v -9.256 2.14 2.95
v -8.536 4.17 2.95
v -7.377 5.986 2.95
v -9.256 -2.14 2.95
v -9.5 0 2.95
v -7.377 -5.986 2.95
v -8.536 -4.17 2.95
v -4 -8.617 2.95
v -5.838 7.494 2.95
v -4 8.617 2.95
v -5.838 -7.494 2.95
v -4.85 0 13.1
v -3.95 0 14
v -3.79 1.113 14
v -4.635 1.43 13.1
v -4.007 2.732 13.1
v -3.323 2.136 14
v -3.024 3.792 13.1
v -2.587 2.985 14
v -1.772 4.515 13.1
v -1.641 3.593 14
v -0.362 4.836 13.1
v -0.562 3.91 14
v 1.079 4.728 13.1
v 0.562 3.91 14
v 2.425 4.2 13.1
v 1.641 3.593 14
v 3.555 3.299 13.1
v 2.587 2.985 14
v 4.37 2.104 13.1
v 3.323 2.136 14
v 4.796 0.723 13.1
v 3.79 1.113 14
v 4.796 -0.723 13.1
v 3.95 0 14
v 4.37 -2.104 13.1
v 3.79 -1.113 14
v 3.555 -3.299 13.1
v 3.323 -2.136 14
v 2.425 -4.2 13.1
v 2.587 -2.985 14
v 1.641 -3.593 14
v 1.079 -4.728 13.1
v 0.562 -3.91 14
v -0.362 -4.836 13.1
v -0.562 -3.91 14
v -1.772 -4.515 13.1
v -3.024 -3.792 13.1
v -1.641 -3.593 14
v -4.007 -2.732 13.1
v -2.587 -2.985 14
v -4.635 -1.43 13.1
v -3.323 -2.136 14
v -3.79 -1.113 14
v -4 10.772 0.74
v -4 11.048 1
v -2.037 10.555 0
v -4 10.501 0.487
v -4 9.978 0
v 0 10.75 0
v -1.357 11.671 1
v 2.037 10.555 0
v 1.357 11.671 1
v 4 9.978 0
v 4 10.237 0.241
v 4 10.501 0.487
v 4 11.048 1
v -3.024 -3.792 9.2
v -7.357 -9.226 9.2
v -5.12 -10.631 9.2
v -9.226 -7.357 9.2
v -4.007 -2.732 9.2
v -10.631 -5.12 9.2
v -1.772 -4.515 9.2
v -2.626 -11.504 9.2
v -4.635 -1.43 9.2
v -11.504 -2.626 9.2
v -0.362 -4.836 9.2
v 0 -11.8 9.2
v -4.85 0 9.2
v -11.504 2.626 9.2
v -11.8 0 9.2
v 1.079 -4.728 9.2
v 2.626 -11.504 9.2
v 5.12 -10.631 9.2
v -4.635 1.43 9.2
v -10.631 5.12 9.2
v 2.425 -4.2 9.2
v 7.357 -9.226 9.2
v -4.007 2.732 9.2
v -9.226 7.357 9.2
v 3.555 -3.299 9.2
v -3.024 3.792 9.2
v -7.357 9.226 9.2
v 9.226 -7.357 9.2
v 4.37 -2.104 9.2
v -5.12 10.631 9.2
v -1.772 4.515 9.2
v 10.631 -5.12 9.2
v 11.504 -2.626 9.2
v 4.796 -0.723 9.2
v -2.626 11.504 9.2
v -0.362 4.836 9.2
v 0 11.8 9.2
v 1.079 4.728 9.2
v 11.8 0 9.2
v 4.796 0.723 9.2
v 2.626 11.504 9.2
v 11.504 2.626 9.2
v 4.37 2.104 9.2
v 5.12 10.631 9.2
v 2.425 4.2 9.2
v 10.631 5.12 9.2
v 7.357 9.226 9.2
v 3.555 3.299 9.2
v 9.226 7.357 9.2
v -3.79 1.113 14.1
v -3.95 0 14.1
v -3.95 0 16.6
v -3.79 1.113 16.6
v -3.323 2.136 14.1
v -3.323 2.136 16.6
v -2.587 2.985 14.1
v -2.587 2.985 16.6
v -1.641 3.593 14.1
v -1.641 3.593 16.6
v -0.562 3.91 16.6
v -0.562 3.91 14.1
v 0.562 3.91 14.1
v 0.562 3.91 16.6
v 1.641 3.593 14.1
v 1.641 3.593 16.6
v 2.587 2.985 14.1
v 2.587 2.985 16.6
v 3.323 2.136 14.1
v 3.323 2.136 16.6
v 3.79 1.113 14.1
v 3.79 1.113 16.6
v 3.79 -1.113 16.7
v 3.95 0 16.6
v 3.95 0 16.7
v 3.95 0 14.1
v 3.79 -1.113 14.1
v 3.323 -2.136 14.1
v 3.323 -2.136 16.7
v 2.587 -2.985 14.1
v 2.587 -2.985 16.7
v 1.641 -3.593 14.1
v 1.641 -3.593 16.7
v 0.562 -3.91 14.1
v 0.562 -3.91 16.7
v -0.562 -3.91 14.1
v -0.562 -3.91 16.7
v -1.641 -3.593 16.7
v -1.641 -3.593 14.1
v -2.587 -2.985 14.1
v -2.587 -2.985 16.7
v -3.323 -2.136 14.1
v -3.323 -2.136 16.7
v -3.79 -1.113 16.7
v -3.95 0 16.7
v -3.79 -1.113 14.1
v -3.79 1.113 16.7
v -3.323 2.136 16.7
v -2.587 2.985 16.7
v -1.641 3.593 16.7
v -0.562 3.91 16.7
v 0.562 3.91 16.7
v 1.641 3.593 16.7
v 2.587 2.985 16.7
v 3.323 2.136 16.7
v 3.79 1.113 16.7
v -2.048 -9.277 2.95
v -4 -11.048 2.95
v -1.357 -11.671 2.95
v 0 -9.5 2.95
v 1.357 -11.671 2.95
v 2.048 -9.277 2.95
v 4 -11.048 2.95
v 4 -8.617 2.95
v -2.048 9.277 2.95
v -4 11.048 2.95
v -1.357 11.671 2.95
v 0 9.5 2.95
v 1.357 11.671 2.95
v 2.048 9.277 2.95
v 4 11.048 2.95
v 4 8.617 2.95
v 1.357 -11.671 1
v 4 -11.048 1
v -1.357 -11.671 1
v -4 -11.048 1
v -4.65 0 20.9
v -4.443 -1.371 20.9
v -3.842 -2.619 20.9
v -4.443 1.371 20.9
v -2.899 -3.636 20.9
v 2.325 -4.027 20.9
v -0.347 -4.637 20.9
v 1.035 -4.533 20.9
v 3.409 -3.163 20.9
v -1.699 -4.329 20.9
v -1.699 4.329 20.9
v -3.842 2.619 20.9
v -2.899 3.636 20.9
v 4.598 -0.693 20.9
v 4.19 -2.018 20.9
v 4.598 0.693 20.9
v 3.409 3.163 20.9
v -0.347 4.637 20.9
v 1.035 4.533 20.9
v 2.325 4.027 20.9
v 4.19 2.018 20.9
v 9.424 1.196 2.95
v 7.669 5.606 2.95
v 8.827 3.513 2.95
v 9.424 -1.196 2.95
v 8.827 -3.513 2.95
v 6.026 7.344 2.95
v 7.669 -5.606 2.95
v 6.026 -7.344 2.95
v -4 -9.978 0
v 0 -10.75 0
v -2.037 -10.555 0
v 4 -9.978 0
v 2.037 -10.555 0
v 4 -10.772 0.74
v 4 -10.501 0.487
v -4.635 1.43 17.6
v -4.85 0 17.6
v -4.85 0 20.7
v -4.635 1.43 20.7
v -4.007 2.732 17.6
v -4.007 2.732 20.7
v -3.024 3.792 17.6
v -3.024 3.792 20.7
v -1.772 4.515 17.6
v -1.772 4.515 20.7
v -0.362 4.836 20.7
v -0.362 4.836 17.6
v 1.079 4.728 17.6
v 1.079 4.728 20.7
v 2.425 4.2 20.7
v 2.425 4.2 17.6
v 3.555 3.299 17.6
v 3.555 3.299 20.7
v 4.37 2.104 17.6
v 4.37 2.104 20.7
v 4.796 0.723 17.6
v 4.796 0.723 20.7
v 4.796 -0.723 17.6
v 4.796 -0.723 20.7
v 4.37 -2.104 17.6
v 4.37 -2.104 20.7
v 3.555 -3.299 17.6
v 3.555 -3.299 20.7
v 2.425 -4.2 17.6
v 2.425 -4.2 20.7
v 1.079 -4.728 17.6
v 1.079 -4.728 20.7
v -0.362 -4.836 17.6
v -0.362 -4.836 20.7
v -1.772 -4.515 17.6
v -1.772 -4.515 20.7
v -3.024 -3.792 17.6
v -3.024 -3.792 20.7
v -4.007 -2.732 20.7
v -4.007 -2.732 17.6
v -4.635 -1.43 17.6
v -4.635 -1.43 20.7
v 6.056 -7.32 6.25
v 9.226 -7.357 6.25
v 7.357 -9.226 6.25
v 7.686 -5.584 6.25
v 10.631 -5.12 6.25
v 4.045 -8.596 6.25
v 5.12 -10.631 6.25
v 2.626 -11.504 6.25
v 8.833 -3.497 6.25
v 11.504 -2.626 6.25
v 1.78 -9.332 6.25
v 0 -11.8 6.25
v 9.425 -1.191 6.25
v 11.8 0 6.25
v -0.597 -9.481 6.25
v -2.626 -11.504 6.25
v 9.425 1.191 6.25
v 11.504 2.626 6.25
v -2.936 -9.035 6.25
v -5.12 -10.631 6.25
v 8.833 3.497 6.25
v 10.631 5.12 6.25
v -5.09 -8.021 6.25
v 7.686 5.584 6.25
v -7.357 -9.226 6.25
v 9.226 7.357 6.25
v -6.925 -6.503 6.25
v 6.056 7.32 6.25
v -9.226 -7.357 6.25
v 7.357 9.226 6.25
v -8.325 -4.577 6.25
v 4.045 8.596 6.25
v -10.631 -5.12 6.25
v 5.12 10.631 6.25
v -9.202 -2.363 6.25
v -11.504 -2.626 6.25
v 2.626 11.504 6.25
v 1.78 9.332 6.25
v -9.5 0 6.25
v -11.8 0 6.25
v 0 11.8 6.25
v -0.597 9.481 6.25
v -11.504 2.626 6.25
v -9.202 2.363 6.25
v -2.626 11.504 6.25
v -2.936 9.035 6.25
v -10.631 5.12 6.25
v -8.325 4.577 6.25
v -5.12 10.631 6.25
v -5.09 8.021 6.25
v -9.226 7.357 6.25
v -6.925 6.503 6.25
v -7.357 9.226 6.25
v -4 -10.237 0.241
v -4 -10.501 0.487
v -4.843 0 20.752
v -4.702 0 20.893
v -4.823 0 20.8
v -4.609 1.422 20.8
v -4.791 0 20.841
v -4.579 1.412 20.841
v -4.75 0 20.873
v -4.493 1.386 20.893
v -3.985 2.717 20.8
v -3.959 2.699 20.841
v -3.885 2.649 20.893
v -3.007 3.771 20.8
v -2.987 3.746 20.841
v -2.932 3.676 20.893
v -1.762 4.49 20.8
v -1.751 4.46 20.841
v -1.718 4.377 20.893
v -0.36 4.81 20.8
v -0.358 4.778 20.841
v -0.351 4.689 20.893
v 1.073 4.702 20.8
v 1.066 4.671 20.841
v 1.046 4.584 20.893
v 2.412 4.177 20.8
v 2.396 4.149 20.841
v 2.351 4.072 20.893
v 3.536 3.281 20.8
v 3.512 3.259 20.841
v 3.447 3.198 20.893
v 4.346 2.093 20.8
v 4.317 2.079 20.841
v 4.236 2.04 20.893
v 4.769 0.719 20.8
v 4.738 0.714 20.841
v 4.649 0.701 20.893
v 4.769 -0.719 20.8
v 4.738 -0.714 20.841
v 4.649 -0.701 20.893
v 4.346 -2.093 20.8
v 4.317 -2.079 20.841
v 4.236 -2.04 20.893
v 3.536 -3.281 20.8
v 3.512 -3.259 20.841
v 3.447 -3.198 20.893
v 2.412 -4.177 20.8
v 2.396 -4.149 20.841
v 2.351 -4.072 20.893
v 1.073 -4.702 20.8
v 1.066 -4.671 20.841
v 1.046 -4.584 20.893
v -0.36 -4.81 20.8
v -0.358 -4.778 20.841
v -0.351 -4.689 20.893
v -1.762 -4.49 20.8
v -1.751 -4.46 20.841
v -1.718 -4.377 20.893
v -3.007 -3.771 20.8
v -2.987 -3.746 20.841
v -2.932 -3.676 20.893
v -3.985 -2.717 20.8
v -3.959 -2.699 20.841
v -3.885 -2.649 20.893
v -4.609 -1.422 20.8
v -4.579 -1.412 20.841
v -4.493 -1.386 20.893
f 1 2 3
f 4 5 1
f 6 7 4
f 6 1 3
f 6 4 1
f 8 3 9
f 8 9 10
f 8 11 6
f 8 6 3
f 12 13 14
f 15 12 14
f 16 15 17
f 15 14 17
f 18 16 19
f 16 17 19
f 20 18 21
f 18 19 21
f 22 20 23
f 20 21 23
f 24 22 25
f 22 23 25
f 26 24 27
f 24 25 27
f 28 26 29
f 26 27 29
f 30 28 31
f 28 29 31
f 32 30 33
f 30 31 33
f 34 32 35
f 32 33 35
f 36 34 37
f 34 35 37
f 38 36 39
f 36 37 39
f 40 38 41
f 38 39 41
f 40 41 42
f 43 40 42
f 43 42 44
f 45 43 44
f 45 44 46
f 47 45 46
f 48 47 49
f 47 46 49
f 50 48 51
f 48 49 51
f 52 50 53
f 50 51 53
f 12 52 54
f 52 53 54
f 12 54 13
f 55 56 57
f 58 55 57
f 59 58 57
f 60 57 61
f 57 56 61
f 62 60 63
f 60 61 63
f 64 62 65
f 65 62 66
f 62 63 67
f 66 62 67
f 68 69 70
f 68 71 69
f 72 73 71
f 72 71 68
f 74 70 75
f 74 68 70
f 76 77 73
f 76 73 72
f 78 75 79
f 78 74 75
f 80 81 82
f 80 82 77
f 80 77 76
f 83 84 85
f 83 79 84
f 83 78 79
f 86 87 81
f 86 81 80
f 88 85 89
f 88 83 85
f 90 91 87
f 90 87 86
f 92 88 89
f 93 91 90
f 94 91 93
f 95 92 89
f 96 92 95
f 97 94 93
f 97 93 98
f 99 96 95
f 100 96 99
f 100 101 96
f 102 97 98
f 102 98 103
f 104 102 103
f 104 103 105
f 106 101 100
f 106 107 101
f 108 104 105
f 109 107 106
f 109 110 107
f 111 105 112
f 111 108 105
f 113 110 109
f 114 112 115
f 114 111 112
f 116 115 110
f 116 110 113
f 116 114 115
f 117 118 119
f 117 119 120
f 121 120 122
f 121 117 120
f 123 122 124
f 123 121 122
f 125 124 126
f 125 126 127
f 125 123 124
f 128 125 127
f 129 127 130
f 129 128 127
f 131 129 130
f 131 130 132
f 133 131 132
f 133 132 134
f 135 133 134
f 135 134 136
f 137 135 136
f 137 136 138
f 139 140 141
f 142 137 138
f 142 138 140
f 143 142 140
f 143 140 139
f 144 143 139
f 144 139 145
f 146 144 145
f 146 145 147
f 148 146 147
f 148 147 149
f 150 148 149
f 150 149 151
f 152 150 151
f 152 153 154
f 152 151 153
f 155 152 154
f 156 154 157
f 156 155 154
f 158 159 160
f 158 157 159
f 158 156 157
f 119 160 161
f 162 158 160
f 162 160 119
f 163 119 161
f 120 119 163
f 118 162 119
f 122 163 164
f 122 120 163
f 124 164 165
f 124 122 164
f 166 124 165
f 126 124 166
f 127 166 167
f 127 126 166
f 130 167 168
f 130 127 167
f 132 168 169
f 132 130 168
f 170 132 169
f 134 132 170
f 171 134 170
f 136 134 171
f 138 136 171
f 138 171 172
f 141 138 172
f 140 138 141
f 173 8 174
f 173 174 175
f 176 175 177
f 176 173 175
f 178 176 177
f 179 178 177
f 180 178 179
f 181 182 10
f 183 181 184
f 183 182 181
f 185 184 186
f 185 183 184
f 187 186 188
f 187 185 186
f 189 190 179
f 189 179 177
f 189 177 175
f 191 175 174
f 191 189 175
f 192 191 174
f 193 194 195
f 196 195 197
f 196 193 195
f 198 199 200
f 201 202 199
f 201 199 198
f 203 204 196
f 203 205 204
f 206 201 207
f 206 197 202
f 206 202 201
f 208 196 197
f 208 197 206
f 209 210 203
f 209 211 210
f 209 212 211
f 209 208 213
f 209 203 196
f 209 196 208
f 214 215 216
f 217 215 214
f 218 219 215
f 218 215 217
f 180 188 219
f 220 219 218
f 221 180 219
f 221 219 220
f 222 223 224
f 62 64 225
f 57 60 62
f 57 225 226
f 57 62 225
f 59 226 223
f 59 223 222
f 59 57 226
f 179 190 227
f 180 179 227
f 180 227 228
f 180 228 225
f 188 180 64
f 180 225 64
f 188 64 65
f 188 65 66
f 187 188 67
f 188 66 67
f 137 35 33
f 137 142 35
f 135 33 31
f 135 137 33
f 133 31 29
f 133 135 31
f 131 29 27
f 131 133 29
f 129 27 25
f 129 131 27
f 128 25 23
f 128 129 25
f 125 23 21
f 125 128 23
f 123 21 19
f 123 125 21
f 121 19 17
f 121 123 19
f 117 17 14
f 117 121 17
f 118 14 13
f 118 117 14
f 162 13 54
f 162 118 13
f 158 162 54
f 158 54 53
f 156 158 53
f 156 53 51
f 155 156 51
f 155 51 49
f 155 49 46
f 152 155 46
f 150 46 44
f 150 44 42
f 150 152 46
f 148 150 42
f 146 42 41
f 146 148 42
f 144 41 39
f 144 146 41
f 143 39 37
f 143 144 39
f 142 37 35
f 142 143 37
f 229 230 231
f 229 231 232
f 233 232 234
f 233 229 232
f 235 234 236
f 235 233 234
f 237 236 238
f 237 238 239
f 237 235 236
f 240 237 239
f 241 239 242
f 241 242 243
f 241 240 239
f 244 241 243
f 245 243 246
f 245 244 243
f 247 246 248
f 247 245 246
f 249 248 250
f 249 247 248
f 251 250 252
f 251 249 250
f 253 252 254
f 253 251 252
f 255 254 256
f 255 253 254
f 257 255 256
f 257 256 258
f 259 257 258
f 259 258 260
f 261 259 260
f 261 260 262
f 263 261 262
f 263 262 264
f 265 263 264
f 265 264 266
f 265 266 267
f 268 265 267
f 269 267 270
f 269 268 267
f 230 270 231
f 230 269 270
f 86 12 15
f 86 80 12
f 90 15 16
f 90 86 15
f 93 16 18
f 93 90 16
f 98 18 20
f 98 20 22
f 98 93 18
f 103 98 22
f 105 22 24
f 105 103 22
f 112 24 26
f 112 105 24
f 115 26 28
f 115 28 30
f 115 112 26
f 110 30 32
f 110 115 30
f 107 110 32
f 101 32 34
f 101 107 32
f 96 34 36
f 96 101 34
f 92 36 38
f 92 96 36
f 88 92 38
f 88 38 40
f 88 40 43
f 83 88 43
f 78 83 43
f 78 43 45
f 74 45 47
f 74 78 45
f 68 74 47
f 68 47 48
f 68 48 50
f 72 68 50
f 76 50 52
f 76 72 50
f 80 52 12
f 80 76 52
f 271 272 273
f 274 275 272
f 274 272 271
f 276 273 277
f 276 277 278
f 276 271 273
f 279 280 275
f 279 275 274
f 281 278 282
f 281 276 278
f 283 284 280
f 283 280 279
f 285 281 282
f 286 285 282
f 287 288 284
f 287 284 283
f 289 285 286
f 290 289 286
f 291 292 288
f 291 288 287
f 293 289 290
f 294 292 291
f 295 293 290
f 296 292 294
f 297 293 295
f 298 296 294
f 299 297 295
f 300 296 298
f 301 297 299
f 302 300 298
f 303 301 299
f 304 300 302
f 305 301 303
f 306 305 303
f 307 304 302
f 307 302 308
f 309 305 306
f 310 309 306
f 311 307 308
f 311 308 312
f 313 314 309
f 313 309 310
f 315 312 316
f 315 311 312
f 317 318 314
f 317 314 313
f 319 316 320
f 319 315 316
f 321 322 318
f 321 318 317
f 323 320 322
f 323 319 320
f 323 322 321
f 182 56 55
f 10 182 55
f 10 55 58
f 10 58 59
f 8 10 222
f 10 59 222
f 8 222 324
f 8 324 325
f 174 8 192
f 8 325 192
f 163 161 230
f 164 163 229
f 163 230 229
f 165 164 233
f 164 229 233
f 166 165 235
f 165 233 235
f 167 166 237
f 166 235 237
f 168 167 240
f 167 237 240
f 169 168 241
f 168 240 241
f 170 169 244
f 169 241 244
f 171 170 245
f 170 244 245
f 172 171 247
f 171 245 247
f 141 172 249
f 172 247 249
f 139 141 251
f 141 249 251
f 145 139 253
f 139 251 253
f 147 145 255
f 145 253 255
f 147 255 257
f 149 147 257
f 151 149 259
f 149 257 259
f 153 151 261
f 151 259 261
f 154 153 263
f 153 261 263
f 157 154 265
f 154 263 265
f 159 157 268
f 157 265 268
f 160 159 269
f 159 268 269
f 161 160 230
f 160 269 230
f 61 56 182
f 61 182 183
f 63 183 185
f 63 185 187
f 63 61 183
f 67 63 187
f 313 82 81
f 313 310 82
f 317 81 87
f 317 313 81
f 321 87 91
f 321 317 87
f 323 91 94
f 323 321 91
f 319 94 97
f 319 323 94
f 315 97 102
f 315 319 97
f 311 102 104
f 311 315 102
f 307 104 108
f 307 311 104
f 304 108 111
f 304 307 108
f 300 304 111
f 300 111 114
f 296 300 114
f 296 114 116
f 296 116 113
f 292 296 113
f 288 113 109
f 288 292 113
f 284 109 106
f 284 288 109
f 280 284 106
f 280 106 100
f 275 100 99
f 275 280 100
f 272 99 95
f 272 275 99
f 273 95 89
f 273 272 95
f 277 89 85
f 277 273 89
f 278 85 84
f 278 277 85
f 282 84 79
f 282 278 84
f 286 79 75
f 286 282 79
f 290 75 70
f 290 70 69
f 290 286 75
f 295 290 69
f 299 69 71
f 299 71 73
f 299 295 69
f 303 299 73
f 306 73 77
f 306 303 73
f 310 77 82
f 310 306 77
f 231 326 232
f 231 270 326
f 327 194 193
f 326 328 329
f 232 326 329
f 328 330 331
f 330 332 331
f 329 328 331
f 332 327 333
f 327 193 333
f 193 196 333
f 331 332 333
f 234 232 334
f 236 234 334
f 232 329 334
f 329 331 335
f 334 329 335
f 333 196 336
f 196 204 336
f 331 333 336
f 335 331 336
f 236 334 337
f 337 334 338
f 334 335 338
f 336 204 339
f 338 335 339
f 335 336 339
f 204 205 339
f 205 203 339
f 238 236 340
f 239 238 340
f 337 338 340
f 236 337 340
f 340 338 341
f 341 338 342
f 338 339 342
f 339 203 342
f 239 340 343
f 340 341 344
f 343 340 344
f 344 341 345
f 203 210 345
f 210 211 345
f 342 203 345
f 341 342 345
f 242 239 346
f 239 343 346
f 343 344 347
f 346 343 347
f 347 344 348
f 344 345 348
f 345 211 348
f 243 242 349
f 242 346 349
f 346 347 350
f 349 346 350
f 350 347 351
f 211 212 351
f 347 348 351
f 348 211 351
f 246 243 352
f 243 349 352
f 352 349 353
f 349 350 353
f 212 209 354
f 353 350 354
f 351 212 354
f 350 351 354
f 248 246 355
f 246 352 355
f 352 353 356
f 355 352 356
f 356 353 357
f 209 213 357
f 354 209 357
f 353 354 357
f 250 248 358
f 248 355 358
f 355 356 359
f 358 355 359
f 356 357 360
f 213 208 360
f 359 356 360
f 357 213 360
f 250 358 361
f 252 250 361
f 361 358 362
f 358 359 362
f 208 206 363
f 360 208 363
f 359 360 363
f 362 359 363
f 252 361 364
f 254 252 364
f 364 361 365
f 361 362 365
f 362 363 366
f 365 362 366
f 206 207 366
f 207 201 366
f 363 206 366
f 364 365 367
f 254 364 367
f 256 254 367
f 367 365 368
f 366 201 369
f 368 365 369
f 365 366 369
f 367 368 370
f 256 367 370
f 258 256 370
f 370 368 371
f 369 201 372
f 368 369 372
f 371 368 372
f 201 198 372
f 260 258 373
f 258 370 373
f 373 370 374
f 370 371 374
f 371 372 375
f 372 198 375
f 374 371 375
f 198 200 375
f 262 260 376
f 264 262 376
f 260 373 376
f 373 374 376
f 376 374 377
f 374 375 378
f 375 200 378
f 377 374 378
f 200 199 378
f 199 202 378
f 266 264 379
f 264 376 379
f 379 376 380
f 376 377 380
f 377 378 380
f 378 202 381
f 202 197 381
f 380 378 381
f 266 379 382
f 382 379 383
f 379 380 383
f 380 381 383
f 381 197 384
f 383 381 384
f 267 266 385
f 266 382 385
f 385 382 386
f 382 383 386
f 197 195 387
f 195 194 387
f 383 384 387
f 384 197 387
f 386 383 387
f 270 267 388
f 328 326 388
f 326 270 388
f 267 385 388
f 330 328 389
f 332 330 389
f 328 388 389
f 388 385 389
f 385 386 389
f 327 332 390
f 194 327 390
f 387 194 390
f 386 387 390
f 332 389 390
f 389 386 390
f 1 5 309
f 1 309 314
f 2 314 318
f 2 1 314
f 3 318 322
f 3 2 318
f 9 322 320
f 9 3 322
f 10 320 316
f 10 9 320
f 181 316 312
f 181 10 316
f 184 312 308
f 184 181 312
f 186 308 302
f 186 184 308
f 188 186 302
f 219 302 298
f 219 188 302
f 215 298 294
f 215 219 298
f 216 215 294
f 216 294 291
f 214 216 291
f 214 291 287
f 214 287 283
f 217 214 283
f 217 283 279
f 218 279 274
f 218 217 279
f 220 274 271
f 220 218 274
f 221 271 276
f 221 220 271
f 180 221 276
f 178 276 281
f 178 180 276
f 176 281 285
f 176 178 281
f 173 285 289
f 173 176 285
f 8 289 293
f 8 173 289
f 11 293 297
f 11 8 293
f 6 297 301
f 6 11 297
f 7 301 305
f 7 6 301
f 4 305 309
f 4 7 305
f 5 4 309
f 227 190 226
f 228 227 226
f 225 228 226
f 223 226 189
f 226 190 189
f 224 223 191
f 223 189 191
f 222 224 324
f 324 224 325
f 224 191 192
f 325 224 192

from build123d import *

# Parameters (mm, degrees)
F3_DEPTH     = 2.95
F4_T2_ANGLE  = 64.8878433285
F4_T4_ANGLE  = 64.8878433285
F4_S9_R      = 3.95
F4_T10_DEPTH = 8
F4_S15_R     = 3.95
F4_T16_DEPTH = 8
F5_R         = 0.2


# Not quite as in the source:
# - a fillet or chamfer that OpenCascade refuses, or shapes differently, is made with other operations: its cross-section is extruded or revolved along the edge and cut away or added


with BuildPart() as f1:
    # F0 (on Front) → F1 (revolve)
    with BuildSketch(Plane.XZ):
        Polygon((-11.75, 0), (0, 0), (0, 20.9), (-4.85, 20.9), (-4.85, 16.6), (-3.95, 16.6), (-3.95, 14.1), (-4.85, 14.1), (-4.85, 9.2), (-11.8, 9.2), (-11.8, 6.25), (-9.5, 6.25), (-9.5, 2.95), (-11.75, 2.95), align=None)
    revolve(axis=Axis((0, 0, 10.45), (0, 0, -1)))

    # F2 (on face) → F3 (cut, through all)
    with BuildSketch(Plane(origin=(0, 0, 0), x_dir=(1, 0, 0), z_dir=(0, 0, -1))):
        with BuildLine():
            Line((-4, -11.048189897), (-4, 11.048189897))
            ThreePointArc((-4, 11.048189897), (-11.75, 0), (-4, -11.048189897))
        make_face()
        with BuildLine():
            ThreePointArc((11.75, 0), (9.6193165038, 6.7476847881), (4, 11.048189897))
            Line((4, 11.048189897), (4, -11.048189897))
            ThreePointArc((4, -11.048189897), (9.6193165038, -6.7476847881), (11.75, 0))
        make_face()
    extrude(amount=-F3_DEPTH, mode=Mode.SUBTRACT)

    # F4: chamfer of 1 on 4 edges, made by hand

    # F4_s1 → F4_t2 (revolve, cut)
    with BuildSketch(Plane(origin=(0, 0, 0), x_dir=(0, 0, 1), z_dir=(0.8439169246, 0.5364738804, 0))):
        Polygon((0, 10.75), (1, 11.75), (0, 11.75), align=None)
    revolve(axis=Axis((0, 0, 0), (0, 0, -1)), revolution_arc=F4_T2_ANGLE, mode=Mode.SUBTRACT)

    # F4_s3 → F4_t4 (revolve, cut)
    with BuildSketch(Plane(origin=(0, 0, 0), x_dir=(0, 0, 1), z_dir=(-0.8439169246, -0.5364738804, 0))):
        Polygon((0, 10.75), (1, 11.75), (0, 11.75), align=None)
    revolve(axis=Axis((0, 0, 0), (0, 0, -1)), revolution_arc=F4_T4_ANGLE, mode=Mode.SUBTRACT)


with BuildPart() as f4_tool6:
    # F4_s7 → F4_t8 (revolve)
    with BuildSketch(Plane.XZ):
        Polygon((-3.85, 16.6), (-4.85, 17.6), (-4.85, 16.6), align=None)
    revolve(axis=Axis((0, 0, 16.6), (0, 0, -1)))

    # F4_s9 → F4_t10 (cut, symmetric)
    with BuildSketch(Plane.XY.offset(17.1)):
        Circle(F4_S9_R)
    extrude(amount=F4_T10_DEPTH, both=True, mode=Mode.SUBTRACT)


with BuildPart() as f1_1:
    add(f1.part)

    # F4_t5: cut F4_tool6
    add(f4_tool6.part, mode=Mode.SUBTRACT)


with BuildPart() as f4_tool12:
    # F4_s13 → F4_t14 (revolve)
    with BuildSketch(Plane.XZ):
        Polygon((-4.85, 13.1), (-3.85, 14.1), (-4.85, 14.1), align=None)
    revolve(axis=Axis((0, 0, 14.1), (0, 0, -1)))

    # F4_s15 → F4_t16 (cut, symmetric)
    with BuildSketch(Plane.XY.offset(13.6)):
        Circle(F4_S15_R)
    extrude(amount=F4_T16_DEPTH, both=True, mode=Mode.SUBTRACT)


with BuildPart() as f1_2:
    add(f1_1.part)

    # F4_t11: cut F4_tool12
    add(f4_tool12.part, mode=Mode.SUBTRACT)

    # F5
    f5_edges = [f1_2.edges().sort_by_distance(p)[0] for p in [
        (4.85, 0, 20.9),
    ]]
    fillet(f5_edges, radius=F5_R)


solid = f1_2.part
